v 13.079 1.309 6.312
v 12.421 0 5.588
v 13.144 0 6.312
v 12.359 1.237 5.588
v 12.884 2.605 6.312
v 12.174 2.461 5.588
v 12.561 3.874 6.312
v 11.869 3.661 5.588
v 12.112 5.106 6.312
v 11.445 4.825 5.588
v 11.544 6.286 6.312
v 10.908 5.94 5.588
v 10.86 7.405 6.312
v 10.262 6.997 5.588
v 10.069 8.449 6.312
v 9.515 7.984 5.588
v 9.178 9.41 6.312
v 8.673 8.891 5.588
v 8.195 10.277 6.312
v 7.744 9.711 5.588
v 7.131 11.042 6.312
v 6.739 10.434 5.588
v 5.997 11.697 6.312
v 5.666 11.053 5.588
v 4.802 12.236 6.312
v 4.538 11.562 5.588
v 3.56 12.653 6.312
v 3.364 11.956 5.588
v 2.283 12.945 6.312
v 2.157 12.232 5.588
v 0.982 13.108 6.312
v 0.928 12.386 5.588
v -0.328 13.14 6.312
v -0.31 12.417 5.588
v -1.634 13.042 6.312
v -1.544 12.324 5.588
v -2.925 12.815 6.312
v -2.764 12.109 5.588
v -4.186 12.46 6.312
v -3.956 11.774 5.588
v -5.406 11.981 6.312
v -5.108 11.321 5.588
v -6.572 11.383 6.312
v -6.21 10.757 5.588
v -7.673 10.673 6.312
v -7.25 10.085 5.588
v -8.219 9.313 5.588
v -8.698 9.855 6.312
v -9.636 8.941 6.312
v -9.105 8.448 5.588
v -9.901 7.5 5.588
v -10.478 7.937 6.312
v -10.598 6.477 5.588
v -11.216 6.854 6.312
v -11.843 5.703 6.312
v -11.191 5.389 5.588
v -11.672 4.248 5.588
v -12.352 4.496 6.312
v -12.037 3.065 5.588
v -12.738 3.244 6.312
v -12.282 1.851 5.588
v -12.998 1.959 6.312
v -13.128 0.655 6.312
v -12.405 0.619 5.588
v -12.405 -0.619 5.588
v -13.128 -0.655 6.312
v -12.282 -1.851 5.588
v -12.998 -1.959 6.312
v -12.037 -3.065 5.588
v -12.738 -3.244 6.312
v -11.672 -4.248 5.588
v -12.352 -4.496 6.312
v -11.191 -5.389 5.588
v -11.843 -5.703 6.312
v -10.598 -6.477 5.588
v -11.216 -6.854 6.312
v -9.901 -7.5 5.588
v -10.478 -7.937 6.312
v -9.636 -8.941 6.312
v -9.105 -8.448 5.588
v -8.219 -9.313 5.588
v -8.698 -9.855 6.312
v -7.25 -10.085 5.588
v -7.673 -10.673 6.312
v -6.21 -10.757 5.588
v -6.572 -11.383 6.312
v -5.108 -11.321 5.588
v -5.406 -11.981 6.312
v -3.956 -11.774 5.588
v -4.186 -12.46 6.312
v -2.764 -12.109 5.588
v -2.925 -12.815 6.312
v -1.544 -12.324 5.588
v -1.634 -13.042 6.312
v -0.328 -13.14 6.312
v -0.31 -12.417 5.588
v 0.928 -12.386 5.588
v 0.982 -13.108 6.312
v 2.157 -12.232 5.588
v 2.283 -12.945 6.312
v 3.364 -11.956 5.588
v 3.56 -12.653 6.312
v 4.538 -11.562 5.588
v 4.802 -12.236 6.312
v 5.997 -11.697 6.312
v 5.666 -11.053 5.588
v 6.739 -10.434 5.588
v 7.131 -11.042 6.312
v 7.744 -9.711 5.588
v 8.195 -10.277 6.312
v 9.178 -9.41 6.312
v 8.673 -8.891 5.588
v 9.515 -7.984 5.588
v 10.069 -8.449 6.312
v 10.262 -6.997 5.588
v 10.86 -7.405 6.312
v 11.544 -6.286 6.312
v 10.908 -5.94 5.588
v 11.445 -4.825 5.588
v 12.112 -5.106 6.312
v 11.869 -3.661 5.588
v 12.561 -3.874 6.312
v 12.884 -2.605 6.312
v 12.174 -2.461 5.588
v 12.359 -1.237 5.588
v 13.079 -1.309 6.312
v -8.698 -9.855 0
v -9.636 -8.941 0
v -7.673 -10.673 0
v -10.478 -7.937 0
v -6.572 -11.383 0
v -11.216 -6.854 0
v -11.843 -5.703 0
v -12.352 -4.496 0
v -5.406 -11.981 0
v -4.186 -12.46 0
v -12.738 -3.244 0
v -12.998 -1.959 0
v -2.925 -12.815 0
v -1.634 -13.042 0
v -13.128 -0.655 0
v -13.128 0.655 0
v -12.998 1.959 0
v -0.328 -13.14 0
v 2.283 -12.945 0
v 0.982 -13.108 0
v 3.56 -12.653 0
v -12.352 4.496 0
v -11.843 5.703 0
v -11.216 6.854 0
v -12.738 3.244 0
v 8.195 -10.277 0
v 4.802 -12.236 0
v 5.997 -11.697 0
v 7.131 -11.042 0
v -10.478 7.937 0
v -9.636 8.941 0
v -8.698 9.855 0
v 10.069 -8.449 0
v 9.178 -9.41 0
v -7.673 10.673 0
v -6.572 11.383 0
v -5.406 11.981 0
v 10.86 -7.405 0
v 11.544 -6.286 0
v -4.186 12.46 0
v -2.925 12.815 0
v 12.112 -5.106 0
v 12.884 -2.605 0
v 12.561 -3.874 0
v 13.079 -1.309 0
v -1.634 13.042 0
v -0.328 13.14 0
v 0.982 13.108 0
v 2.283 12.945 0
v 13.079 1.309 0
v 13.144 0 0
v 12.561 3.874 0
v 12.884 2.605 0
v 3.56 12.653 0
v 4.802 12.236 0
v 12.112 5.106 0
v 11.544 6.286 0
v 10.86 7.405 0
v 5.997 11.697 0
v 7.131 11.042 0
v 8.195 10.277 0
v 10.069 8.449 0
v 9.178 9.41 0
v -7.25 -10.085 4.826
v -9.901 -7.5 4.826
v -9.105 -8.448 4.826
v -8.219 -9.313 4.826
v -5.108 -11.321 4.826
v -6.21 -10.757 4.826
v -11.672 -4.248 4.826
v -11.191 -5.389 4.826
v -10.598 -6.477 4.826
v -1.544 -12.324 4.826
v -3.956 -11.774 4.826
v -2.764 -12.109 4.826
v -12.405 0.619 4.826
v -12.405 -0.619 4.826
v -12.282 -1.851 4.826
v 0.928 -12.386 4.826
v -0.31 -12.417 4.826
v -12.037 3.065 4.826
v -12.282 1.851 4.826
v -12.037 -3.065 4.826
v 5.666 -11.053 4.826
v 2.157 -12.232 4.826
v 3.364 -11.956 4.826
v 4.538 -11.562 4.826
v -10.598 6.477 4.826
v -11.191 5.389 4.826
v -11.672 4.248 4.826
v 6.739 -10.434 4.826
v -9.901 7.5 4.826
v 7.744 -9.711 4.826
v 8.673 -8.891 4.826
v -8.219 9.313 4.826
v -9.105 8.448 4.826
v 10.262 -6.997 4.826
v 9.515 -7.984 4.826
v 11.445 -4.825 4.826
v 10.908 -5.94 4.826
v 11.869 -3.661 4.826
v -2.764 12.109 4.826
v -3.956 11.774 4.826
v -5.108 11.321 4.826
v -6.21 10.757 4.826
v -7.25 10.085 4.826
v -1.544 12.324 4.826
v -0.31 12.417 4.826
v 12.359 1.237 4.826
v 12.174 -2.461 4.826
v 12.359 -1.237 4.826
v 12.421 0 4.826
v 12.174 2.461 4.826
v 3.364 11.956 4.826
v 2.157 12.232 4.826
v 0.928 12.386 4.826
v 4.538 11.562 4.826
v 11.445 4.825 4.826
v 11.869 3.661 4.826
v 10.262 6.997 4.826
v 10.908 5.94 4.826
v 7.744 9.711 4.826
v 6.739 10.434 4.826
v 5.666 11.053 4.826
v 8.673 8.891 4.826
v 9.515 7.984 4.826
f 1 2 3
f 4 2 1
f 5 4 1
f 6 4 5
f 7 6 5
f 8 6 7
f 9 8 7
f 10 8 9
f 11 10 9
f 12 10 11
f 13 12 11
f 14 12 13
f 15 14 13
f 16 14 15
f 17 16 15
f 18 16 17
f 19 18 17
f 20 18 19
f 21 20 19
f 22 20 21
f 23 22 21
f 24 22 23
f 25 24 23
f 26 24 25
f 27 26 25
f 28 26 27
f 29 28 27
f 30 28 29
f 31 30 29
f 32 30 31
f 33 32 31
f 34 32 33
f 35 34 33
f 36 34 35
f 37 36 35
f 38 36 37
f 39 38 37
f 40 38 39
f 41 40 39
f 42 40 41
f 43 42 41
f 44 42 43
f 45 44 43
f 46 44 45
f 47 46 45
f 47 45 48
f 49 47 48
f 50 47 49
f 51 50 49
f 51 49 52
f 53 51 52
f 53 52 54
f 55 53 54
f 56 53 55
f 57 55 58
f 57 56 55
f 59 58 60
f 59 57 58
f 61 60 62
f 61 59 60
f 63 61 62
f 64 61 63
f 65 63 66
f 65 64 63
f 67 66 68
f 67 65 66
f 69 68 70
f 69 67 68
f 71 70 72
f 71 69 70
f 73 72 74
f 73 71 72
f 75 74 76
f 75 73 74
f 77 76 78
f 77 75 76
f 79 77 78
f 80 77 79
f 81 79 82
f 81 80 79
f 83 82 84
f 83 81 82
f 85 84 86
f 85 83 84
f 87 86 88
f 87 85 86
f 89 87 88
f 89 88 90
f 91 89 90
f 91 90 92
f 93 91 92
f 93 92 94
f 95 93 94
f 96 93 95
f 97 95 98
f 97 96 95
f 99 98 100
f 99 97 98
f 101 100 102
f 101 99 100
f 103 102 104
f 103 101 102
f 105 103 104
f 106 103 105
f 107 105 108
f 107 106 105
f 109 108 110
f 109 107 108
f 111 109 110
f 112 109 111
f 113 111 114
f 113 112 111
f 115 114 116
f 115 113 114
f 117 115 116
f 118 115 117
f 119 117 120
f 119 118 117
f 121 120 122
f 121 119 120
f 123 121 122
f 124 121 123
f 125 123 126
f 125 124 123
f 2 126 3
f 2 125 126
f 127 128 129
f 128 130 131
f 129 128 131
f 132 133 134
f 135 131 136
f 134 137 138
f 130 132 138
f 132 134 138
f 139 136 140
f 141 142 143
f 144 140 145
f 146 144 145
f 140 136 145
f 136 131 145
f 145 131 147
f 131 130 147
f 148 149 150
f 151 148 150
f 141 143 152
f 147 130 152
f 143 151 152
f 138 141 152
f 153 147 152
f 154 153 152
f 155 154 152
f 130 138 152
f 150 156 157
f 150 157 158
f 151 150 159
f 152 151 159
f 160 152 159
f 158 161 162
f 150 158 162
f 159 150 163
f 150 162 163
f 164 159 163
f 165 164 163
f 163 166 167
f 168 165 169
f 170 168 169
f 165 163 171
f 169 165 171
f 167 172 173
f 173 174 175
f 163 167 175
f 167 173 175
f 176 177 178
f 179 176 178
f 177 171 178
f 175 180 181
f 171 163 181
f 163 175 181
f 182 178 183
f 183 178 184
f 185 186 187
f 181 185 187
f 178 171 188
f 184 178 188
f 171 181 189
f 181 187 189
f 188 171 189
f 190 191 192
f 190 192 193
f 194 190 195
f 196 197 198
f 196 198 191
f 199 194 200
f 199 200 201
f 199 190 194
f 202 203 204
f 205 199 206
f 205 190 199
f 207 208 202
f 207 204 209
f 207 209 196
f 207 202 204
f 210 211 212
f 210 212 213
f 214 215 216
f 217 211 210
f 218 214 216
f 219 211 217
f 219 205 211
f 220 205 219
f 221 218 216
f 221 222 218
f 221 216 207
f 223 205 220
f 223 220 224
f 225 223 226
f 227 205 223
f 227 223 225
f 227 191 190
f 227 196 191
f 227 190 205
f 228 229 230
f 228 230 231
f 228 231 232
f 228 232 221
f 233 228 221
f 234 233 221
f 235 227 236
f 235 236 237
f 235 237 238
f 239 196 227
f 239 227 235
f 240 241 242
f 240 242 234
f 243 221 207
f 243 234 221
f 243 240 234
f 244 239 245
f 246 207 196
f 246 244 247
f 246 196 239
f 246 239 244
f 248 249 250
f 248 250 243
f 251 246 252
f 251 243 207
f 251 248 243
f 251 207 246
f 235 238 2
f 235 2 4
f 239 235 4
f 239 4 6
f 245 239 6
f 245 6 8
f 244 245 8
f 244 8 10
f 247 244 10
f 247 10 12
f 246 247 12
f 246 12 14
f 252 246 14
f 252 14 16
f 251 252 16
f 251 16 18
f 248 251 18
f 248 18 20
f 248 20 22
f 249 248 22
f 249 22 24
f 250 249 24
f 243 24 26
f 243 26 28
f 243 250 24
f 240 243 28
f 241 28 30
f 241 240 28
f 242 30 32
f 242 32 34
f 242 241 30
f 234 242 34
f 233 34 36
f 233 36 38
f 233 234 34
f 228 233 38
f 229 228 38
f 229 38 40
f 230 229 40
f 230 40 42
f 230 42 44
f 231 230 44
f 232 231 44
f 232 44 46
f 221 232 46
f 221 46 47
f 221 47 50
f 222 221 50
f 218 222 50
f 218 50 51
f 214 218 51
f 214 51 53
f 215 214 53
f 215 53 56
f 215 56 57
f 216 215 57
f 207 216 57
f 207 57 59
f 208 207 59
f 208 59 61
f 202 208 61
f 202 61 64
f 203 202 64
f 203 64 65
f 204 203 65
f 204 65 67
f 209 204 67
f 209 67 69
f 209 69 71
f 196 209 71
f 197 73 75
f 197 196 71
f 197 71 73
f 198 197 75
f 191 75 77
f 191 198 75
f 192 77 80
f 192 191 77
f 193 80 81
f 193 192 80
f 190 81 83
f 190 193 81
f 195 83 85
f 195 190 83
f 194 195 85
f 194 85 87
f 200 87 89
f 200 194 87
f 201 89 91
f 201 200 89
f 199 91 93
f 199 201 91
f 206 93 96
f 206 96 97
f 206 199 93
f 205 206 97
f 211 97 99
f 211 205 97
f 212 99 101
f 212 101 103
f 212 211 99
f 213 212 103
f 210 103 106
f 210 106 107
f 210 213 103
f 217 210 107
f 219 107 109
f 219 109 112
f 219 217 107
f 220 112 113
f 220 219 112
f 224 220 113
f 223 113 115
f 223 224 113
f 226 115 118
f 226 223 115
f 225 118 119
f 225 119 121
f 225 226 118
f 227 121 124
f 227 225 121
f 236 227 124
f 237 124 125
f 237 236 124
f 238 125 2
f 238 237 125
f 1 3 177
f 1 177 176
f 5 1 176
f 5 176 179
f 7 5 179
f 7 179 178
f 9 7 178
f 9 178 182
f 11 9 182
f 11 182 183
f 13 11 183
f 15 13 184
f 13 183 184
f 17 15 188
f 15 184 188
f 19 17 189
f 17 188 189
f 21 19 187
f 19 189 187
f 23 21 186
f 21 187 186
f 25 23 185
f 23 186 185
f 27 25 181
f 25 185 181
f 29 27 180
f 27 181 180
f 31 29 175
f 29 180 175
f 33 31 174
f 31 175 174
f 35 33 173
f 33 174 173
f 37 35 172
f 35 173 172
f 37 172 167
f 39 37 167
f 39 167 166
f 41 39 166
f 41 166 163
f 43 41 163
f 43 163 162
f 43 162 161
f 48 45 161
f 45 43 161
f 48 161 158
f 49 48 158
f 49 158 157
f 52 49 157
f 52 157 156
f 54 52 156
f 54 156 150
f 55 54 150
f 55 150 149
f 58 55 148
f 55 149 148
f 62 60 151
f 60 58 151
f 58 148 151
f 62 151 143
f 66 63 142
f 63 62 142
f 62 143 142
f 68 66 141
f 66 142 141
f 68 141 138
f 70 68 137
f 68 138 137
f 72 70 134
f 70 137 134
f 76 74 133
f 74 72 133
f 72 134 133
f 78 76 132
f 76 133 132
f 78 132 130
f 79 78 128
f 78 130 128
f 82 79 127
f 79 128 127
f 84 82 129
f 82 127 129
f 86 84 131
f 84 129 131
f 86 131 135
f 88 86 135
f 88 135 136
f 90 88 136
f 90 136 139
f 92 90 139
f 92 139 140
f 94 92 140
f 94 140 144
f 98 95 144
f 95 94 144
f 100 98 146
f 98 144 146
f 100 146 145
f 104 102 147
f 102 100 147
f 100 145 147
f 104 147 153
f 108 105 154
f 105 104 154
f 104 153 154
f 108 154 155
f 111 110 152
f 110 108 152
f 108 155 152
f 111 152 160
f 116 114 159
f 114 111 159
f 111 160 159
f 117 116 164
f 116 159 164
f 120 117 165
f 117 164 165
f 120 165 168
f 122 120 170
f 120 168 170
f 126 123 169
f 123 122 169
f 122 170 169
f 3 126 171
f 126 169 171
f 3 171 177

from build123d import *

# Parameters (mm, degrees)
F0_R     = 13.1445
F1_DEPTH = 4.826
F2_R     = 13.1445
F2_R_2   = 12.4206
F3_DEPTH = 1.524


# Not quite as in the source:
# - a fillet or chamfer that OpenCascade refuses, or shapes differently, is made with other operations: its cross-section is extruded or revolved along the edge and cut away or added


with BuildPart() as f1:
    # F0 (on Top) → F1 (new body)
    with BuildSketch(Plane.XY):
        Circle(F0_R)
    extrude(amount=F1_DEPTH)

    # F2 (on face) → F3 (join)
    with BuildSketch(Plane.XY.offset(4.826)):
        Circle(F2_R)
        Circle(F2_R_2, mode=Mode.SUBTRACT)
    extrude(amount=F3_DEPTH)

    # F4: chamfer of 0.762 on 1 edges, made by hand

    # F4_s1 → F4_t2 (revolve, cut)
    with BuildSketch(Plane.XZ):
        Polygon((13.1826, 6.35), (12.4206, 5.588), (12.4206, 6.35), align=None)
    revolve(axis=Axis((0, 0, 6.35), (0, 0, 1)), mode=Mode.SUBTRACT)


solid = f1.part
